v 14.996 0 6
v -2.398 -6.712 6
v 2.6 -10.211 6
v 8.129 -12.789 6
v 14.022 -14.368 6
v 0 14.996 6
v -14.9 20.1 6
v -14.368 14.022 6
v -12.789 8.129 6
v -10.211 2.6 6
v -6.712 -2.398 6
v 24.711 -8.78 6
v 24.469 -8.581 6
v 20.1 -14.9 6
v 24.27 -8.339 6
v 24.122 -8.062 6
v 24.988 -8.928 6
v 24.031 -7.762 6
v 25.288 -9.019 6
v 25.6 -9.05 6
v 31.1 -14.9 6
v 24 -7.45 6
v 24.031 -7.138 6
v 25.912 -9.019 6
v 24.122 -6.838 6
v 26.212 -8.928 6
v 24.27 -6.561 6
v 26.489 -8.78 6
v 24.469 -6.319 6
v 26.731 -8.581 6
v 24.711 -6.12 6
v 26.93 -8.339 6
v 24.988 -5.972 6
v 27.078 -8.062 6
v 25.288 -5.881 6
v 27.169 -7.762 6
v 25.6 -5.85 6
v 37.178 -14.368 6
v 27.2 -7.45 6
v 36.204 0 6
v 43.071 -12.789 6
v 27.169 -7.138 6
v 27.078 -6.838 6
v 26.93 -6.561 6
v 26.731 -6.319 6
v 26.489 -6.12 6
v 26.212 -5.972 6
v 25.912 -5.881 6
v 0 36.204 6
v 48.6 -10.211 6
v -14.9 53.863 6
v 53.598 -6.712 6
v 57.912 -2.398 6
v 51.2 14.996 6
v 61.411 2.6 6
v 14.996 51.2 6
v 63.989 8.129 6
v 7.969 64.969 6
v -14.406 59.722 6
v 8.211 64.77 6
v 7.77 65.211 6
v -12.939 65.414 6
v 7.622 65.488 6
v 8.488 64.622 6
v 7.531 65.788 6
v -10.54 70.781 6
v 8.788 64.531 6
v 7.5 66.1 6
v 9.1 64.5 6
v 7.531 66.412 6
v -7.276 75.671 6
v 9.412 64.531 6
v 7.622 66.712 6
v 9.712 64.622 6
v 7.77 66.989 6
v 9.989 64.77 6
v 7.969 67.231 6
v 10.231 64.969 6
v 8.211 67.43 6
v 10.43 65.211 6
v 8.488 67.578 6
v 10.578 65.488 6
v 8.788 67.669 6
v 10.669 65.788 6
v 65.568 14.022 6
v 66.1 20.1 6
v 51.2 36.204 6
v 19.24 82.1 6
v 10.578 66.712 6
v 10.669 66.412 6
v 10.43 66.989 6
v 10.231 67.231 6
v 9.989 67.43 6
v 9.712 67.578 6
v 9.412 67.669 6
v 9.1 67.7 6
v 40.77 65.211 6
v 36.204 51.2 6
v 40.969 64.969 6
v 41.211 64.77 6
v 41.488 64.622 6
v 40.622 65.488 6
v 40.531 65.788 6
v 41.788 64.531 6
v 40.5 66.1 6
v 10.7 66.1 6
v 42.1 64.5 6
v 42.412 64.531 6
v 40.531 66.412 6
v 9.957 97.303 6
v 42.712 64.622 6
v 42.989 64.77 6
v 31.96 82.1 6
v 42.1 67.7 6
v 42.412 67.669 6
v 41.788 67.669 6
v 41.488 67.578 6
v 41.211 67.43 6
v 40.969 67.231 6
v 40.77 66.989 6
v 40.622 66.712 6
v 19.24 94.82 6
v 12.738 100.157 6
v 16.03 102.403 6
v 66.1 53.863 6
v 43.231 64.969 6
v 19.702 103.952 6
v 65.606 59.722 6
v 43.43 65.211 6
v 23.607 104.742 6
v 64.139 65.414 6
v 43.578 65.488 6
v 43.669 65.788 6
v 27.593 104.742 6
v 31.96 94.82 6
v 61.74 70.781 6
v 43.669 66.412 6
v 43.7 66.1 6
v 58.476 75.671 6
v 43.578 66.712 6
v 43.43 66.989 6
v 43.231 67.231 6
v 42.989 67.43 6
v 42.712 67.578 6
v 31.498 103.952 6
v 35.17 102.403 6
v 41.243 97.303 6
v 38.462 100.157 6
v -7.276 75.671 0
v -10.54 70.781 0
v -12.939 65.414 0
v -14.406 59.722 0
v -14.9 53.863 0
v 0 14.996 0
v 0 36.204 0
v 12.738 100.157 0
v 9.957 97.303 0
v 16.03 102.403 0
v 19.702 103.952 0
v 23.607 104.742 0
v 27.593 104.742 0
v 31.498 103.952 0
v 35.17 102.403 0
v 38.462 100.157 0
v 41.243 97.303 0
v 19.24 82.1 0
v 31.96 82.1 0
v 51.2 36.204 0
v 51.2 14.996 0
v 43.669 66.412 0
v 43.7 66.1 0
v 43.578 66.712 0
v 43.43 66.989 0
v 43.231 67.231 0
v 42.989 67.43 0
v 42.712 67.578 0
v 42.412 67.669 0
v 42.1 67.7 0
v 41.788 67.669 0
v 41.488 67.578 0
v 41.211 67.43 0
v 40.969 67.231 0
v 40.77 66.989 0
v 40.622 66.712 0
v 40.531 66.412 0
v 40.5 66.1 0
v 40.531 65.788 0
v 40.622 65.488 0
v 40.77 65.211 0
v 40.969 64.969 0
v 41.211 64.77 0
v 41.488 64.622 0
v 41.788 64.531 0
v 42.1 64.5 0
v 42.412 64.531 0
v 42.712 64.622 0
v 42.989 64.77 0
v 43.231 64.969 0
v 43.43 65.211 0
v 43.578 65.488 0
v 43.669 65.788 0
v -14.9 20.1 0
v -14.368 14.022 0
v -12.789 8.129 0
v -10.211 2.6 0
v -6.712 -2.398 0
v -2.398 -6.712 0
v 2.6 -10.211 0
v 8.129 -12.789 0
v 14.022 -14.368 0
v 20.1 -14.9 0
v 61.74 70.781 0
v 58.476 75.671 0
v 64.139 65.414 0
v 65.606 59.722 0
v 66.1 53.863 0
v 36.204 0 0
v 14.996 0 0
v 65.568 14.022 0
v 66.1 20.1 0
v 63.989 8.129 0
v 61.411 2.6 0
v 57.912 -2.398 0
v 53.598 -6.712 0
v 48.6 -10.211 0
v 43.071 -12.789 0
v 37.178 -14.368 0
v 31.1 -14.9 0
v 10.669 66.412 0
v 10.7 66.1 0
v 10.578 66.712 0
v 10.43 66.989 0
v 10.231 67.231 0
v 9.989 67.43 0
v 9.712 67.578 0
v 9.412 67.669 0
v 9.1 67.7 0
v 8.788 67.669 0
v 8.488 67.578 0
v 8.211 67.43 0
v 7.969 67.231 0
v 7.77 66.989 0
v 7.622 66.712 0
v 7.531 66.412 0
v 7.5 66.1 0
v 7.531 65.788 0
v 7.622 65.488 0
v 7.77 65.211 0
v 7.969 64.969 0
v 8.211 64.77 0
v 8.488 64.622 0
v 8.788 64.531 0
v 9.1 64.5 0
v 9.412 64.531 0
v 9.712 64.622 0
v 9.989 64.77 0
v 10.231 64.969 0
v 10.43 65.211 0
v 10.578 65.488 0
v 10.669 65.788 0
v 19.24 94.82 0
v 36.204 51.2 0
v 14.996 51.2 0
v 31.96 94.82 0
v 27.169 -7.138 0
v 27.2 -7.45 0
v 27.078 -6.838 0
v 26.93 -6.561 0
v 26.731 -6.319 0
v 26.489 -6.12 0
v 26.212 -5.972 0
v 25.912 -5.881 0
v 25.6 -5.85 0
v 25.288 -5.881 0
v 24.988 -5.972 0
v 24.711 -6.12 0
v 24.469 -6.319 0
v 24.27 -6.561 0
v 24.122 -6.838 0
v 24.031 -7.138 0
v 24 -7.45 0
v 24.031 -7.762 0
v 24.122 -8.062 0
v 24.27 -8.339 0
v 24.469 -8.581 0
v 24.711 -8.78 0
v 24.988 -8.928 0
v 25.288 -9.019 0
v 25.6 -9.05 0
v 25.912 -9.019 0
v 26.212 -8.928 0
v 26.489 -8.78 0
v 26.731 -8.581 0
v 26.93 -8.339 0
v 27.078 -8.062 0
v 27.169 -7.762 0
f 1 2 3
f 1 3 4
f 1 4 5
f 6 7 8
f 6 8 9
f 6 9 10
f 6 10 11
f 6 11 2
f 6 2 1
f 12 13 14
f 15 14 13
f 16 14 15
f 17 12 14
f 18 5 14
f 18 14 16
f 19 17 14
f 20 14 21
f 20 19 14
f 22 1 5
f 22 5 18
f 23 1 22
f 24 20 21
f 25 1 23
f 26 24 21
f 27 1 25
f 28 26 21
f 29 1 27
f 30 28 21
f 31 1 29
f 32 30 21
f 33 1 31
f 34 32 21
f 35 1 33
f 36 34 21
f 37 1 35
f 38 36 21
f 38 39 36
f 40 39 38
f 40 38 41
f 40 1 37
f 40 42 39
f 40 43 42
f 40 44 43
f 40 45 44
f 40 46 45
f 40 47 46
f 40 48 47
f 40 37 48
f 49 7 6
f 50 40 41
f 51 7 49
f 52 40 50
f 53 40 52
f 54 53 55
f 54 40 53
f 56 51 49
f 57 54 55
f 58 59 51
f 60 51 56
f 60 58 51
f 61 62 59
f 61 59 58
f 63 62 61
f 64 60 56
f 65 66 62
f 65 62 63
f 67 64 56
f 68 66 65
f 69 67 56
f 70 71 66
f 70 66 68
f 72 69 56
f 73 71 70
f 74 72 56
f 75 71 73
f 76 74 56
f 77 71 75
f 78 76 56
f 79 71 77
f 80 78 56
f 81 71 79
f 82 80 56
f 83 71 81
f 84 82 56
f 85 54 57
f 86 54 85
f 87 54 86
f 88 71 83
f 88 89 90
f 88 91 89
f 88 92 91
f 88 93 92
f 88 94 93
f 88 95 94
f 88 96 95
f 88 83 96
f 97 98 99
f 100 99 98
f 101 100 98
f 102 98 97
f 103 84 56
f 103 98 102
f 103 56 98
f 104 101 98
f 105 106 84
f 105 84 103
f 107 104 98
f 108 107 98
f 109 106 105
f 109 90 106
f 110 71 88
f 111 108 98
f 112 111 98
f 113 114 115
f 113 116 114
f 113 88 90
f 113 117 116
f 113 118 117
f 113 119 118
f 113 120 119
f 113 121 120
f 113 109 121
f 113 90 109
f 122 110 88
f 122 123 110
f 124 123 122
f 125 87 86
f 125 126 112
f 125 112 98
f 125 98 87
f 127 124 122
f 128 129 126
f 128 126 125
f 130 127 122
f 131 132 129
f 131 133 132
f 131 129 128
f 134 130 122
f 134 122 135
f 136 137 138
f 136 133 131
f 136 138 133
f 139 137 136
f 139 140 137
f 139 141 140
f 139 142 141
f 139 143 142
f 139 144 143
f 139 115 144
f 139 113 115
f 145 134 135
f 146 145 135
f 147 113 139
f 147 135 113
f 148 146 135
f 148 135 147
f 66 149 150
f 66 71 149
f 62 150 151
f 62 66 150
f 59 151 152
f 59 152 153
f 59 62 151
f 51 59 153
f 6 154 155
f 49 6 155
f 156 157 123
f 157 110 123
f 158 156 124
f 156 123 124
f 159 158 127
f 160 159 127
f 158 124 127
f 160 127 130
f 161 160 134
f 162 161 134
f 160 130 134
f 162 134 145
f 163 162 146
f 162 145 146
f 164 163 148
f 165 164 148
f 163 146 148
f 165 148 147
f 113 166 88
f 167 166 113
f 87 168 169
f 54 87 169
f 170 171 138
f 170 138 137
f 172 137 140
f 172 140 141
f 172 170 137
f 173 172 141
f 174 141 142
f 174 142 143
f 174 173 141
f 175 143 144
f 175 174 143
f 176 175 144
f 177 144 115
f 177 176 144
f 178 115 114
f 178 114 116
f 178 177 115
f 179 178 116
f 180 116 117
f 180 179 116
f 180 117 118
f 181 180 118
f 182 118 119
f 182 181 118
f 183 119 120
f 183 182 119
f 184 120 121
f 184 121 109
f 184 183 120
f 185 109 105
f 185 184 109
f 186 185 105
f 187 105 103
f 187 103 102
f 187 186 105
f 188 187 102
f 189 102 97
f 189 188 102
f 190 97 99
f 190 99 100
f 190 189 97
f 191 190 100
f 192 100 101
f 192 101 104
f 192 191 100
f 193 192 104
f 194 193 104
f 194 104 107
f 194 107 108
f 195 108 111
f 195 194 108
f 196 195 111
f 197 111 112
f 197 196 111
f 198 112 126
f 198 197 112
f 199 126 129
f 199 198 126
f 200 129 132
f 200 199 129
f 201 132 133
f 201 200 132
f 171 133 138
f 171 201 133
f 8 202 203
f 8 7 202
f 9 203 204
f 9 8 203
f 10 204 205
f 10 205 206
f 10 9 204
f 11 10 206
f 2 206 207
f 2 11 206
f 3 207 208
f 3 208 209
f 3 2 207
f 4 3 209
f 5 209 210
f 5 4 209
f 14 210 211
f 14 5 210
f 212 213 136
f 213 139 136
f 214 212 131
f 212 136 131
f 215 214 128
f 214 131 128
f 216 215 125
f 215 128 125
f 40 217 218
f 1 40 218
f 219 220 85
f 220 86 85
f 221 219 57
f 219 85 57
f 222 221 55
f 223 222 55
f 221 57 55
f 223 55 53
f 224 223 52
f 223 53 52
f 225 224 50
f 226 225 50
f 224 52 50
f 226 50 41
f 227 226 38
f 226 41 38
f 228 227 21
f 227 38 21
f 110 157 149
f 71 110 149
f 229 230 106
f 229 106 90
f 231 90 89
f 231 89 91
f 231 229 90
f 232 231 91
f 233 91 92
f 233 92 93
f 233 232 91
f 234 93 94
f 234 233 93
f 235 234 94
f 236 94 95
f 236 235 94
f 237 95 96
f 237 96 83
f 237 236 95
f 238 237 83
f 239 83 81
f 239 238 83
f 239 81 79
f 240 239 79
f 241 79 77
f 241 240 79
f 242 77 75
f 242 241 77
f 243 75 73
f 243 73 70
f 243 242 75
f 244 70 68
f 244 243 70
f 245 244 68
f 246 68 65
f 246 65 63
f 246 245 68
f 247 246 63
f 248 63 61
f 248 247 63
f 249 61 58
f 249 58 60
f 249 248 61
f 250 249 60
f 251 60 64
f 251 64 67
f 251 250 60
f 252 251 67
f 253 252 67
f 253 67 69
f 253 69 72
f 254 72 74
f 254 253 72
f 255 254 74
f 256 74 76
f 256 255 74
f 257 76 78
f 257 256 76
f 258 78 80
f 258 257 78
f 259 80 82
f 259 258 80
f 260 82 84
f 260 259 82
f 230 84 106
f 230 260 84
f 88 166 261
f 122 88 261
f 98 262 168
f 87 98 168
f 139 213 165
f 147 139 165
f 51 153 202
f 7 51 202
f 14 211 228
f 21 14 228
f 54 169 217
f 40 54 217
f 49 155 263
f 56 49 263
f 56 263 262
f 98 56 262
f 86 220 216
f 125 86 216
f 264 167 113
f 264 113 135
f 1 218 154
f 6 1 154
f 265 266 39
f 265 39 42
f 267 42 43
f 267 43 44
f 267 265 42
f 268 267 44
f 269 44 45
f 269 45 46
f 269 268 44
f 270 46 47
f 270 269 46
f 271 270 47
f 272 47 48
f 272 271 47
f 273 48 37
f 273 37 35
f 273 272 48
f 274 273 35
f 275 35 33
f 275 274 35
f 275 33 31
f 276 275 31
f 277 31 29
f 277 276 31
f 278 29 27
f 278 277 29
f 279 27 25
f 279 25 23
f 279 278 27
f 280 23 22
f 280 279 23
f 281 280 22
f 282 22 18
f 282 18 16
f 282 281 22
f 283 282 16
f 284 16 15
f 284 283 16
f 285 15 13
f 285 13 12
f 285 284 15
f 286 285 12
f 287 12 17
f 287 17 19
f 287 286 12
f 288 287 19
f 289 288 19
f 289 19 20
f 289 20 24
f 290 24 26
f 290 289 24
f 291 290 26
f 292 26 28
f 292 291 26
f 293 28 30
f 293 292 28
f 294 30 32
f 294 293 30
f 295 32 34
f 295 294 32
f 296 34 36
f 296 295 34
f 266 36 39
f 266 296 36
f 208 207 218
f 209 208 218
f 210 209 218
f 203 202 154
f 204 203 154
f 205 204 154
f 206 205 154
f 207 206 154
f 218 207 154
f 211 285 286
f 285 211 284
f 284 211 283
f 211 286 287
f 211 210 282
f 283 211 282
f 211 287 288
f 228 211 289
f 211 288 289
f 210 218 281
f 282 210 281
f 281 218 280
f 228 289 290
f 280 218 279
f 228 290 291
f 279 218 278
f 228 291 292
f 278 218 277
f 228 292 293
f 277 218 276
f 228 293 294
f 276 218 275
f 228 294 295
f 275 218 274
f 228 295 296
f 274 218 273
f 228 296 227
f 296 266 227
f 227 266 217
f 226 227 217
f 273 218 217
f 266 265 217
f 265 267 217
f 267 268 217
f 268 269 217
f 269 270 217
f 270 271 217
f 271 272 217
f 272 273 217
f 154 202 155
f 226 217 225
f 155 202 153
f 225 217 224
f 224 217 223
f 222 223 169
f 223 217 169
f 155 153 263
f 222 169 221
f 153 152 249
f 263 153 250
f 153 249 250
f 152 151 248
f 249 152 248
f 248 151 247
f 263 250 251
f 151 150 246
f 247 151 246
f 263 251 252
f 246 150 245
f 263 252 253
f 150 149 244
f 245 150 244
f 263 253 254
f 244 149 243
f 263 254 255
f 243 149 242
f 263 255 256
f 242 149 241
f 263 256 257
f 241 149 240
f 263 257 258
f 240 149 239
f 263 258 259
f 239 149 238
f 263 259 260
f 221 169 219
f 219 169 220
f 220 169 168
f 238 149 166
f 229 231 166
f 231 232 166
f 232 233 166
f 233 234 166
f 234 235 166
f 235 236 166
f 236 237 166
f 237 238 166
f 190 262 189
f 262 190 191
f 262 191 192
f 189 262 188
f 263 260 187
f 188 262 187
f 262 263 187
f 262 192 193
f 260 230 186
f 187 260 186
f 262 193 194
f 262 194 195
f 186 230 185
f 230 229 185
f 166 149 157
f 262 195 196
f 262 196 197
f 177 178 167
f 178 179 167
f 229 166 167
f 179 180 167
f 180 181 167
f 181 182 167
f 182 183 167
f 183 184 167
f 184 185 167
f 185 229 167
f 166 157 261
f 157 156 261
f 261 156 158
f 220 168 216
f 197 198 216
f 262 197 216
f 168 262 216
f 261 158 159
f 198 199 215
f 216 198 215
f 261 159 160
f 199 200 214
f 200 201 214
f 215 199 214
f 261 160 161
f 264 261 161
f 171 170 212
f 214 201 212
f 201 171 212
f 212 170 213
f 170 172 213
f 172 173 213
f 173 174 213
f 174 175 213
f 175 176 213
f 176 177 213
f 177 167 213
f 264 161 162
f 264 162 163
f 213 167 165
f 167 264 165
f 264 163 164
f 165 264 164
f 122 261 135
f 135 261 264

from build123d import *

# Parameters (mm, degrees)
F0_R     = 1.6
F0_W     = 12.72
F0_H     = 12.72
F1_DEPTH = 6
F2_R     = 35
F3_R     = 20


with BuildPart() as f1:
    # F0 (on Top) → F1 (new body)
    with BuildSketch(Plane.XY):
        Polygon((25.6, 116.940437), (-14.9, 66.1), (-14.9, -14.9), (66.1, -14.9), (66.1, 66.1), align=None)
        with Locations((25.6, -7.45)):
            Circle(F0_R, mode=Mode.SUBTRACT)
        Polygon((0, 14.996133), (0, 36.203867), (14.996133, 51.2), (36.203867, 51.2), (51.2, 36.203867), (51.2, 14.996133), (36.203867, 0), (14.996133, 0), align=None, mode=Mode.SUBTRACT)
        with Locations((9.1, 66.1)):
            Circle(F0_R, mode=Mode.SUBTRACT)
        with Locations((42.1, 66.1)):
            Circle(F0_R, mode=Mode.SUBTRACT)
        with Locations((25.6, 88.46)):
            Rectangle(F0_W, F0_H, mode=Mode.SUBTRACT)
    extrude(amount=F1_DEPTH)

    # F2
    f2_edges = [f1.edges().sort_by_distance(p)[0] for p in [
        (66.1, -14.9, 3),
        (-14.9, -14.9, 3),
        (-14.9, 66.1, 3),
        (66.1, 66.1, 3),
    ]]
    fillet(f2_edges, radius=F2_R)

    # F3
    f3_edges = [f1.edges().sort_by_distance(p)[0] for p in [
        (25.6, 116.940437, 3),
    ]]
    fillet(f3_edges, radius=F3_R)


solid = f1.part
